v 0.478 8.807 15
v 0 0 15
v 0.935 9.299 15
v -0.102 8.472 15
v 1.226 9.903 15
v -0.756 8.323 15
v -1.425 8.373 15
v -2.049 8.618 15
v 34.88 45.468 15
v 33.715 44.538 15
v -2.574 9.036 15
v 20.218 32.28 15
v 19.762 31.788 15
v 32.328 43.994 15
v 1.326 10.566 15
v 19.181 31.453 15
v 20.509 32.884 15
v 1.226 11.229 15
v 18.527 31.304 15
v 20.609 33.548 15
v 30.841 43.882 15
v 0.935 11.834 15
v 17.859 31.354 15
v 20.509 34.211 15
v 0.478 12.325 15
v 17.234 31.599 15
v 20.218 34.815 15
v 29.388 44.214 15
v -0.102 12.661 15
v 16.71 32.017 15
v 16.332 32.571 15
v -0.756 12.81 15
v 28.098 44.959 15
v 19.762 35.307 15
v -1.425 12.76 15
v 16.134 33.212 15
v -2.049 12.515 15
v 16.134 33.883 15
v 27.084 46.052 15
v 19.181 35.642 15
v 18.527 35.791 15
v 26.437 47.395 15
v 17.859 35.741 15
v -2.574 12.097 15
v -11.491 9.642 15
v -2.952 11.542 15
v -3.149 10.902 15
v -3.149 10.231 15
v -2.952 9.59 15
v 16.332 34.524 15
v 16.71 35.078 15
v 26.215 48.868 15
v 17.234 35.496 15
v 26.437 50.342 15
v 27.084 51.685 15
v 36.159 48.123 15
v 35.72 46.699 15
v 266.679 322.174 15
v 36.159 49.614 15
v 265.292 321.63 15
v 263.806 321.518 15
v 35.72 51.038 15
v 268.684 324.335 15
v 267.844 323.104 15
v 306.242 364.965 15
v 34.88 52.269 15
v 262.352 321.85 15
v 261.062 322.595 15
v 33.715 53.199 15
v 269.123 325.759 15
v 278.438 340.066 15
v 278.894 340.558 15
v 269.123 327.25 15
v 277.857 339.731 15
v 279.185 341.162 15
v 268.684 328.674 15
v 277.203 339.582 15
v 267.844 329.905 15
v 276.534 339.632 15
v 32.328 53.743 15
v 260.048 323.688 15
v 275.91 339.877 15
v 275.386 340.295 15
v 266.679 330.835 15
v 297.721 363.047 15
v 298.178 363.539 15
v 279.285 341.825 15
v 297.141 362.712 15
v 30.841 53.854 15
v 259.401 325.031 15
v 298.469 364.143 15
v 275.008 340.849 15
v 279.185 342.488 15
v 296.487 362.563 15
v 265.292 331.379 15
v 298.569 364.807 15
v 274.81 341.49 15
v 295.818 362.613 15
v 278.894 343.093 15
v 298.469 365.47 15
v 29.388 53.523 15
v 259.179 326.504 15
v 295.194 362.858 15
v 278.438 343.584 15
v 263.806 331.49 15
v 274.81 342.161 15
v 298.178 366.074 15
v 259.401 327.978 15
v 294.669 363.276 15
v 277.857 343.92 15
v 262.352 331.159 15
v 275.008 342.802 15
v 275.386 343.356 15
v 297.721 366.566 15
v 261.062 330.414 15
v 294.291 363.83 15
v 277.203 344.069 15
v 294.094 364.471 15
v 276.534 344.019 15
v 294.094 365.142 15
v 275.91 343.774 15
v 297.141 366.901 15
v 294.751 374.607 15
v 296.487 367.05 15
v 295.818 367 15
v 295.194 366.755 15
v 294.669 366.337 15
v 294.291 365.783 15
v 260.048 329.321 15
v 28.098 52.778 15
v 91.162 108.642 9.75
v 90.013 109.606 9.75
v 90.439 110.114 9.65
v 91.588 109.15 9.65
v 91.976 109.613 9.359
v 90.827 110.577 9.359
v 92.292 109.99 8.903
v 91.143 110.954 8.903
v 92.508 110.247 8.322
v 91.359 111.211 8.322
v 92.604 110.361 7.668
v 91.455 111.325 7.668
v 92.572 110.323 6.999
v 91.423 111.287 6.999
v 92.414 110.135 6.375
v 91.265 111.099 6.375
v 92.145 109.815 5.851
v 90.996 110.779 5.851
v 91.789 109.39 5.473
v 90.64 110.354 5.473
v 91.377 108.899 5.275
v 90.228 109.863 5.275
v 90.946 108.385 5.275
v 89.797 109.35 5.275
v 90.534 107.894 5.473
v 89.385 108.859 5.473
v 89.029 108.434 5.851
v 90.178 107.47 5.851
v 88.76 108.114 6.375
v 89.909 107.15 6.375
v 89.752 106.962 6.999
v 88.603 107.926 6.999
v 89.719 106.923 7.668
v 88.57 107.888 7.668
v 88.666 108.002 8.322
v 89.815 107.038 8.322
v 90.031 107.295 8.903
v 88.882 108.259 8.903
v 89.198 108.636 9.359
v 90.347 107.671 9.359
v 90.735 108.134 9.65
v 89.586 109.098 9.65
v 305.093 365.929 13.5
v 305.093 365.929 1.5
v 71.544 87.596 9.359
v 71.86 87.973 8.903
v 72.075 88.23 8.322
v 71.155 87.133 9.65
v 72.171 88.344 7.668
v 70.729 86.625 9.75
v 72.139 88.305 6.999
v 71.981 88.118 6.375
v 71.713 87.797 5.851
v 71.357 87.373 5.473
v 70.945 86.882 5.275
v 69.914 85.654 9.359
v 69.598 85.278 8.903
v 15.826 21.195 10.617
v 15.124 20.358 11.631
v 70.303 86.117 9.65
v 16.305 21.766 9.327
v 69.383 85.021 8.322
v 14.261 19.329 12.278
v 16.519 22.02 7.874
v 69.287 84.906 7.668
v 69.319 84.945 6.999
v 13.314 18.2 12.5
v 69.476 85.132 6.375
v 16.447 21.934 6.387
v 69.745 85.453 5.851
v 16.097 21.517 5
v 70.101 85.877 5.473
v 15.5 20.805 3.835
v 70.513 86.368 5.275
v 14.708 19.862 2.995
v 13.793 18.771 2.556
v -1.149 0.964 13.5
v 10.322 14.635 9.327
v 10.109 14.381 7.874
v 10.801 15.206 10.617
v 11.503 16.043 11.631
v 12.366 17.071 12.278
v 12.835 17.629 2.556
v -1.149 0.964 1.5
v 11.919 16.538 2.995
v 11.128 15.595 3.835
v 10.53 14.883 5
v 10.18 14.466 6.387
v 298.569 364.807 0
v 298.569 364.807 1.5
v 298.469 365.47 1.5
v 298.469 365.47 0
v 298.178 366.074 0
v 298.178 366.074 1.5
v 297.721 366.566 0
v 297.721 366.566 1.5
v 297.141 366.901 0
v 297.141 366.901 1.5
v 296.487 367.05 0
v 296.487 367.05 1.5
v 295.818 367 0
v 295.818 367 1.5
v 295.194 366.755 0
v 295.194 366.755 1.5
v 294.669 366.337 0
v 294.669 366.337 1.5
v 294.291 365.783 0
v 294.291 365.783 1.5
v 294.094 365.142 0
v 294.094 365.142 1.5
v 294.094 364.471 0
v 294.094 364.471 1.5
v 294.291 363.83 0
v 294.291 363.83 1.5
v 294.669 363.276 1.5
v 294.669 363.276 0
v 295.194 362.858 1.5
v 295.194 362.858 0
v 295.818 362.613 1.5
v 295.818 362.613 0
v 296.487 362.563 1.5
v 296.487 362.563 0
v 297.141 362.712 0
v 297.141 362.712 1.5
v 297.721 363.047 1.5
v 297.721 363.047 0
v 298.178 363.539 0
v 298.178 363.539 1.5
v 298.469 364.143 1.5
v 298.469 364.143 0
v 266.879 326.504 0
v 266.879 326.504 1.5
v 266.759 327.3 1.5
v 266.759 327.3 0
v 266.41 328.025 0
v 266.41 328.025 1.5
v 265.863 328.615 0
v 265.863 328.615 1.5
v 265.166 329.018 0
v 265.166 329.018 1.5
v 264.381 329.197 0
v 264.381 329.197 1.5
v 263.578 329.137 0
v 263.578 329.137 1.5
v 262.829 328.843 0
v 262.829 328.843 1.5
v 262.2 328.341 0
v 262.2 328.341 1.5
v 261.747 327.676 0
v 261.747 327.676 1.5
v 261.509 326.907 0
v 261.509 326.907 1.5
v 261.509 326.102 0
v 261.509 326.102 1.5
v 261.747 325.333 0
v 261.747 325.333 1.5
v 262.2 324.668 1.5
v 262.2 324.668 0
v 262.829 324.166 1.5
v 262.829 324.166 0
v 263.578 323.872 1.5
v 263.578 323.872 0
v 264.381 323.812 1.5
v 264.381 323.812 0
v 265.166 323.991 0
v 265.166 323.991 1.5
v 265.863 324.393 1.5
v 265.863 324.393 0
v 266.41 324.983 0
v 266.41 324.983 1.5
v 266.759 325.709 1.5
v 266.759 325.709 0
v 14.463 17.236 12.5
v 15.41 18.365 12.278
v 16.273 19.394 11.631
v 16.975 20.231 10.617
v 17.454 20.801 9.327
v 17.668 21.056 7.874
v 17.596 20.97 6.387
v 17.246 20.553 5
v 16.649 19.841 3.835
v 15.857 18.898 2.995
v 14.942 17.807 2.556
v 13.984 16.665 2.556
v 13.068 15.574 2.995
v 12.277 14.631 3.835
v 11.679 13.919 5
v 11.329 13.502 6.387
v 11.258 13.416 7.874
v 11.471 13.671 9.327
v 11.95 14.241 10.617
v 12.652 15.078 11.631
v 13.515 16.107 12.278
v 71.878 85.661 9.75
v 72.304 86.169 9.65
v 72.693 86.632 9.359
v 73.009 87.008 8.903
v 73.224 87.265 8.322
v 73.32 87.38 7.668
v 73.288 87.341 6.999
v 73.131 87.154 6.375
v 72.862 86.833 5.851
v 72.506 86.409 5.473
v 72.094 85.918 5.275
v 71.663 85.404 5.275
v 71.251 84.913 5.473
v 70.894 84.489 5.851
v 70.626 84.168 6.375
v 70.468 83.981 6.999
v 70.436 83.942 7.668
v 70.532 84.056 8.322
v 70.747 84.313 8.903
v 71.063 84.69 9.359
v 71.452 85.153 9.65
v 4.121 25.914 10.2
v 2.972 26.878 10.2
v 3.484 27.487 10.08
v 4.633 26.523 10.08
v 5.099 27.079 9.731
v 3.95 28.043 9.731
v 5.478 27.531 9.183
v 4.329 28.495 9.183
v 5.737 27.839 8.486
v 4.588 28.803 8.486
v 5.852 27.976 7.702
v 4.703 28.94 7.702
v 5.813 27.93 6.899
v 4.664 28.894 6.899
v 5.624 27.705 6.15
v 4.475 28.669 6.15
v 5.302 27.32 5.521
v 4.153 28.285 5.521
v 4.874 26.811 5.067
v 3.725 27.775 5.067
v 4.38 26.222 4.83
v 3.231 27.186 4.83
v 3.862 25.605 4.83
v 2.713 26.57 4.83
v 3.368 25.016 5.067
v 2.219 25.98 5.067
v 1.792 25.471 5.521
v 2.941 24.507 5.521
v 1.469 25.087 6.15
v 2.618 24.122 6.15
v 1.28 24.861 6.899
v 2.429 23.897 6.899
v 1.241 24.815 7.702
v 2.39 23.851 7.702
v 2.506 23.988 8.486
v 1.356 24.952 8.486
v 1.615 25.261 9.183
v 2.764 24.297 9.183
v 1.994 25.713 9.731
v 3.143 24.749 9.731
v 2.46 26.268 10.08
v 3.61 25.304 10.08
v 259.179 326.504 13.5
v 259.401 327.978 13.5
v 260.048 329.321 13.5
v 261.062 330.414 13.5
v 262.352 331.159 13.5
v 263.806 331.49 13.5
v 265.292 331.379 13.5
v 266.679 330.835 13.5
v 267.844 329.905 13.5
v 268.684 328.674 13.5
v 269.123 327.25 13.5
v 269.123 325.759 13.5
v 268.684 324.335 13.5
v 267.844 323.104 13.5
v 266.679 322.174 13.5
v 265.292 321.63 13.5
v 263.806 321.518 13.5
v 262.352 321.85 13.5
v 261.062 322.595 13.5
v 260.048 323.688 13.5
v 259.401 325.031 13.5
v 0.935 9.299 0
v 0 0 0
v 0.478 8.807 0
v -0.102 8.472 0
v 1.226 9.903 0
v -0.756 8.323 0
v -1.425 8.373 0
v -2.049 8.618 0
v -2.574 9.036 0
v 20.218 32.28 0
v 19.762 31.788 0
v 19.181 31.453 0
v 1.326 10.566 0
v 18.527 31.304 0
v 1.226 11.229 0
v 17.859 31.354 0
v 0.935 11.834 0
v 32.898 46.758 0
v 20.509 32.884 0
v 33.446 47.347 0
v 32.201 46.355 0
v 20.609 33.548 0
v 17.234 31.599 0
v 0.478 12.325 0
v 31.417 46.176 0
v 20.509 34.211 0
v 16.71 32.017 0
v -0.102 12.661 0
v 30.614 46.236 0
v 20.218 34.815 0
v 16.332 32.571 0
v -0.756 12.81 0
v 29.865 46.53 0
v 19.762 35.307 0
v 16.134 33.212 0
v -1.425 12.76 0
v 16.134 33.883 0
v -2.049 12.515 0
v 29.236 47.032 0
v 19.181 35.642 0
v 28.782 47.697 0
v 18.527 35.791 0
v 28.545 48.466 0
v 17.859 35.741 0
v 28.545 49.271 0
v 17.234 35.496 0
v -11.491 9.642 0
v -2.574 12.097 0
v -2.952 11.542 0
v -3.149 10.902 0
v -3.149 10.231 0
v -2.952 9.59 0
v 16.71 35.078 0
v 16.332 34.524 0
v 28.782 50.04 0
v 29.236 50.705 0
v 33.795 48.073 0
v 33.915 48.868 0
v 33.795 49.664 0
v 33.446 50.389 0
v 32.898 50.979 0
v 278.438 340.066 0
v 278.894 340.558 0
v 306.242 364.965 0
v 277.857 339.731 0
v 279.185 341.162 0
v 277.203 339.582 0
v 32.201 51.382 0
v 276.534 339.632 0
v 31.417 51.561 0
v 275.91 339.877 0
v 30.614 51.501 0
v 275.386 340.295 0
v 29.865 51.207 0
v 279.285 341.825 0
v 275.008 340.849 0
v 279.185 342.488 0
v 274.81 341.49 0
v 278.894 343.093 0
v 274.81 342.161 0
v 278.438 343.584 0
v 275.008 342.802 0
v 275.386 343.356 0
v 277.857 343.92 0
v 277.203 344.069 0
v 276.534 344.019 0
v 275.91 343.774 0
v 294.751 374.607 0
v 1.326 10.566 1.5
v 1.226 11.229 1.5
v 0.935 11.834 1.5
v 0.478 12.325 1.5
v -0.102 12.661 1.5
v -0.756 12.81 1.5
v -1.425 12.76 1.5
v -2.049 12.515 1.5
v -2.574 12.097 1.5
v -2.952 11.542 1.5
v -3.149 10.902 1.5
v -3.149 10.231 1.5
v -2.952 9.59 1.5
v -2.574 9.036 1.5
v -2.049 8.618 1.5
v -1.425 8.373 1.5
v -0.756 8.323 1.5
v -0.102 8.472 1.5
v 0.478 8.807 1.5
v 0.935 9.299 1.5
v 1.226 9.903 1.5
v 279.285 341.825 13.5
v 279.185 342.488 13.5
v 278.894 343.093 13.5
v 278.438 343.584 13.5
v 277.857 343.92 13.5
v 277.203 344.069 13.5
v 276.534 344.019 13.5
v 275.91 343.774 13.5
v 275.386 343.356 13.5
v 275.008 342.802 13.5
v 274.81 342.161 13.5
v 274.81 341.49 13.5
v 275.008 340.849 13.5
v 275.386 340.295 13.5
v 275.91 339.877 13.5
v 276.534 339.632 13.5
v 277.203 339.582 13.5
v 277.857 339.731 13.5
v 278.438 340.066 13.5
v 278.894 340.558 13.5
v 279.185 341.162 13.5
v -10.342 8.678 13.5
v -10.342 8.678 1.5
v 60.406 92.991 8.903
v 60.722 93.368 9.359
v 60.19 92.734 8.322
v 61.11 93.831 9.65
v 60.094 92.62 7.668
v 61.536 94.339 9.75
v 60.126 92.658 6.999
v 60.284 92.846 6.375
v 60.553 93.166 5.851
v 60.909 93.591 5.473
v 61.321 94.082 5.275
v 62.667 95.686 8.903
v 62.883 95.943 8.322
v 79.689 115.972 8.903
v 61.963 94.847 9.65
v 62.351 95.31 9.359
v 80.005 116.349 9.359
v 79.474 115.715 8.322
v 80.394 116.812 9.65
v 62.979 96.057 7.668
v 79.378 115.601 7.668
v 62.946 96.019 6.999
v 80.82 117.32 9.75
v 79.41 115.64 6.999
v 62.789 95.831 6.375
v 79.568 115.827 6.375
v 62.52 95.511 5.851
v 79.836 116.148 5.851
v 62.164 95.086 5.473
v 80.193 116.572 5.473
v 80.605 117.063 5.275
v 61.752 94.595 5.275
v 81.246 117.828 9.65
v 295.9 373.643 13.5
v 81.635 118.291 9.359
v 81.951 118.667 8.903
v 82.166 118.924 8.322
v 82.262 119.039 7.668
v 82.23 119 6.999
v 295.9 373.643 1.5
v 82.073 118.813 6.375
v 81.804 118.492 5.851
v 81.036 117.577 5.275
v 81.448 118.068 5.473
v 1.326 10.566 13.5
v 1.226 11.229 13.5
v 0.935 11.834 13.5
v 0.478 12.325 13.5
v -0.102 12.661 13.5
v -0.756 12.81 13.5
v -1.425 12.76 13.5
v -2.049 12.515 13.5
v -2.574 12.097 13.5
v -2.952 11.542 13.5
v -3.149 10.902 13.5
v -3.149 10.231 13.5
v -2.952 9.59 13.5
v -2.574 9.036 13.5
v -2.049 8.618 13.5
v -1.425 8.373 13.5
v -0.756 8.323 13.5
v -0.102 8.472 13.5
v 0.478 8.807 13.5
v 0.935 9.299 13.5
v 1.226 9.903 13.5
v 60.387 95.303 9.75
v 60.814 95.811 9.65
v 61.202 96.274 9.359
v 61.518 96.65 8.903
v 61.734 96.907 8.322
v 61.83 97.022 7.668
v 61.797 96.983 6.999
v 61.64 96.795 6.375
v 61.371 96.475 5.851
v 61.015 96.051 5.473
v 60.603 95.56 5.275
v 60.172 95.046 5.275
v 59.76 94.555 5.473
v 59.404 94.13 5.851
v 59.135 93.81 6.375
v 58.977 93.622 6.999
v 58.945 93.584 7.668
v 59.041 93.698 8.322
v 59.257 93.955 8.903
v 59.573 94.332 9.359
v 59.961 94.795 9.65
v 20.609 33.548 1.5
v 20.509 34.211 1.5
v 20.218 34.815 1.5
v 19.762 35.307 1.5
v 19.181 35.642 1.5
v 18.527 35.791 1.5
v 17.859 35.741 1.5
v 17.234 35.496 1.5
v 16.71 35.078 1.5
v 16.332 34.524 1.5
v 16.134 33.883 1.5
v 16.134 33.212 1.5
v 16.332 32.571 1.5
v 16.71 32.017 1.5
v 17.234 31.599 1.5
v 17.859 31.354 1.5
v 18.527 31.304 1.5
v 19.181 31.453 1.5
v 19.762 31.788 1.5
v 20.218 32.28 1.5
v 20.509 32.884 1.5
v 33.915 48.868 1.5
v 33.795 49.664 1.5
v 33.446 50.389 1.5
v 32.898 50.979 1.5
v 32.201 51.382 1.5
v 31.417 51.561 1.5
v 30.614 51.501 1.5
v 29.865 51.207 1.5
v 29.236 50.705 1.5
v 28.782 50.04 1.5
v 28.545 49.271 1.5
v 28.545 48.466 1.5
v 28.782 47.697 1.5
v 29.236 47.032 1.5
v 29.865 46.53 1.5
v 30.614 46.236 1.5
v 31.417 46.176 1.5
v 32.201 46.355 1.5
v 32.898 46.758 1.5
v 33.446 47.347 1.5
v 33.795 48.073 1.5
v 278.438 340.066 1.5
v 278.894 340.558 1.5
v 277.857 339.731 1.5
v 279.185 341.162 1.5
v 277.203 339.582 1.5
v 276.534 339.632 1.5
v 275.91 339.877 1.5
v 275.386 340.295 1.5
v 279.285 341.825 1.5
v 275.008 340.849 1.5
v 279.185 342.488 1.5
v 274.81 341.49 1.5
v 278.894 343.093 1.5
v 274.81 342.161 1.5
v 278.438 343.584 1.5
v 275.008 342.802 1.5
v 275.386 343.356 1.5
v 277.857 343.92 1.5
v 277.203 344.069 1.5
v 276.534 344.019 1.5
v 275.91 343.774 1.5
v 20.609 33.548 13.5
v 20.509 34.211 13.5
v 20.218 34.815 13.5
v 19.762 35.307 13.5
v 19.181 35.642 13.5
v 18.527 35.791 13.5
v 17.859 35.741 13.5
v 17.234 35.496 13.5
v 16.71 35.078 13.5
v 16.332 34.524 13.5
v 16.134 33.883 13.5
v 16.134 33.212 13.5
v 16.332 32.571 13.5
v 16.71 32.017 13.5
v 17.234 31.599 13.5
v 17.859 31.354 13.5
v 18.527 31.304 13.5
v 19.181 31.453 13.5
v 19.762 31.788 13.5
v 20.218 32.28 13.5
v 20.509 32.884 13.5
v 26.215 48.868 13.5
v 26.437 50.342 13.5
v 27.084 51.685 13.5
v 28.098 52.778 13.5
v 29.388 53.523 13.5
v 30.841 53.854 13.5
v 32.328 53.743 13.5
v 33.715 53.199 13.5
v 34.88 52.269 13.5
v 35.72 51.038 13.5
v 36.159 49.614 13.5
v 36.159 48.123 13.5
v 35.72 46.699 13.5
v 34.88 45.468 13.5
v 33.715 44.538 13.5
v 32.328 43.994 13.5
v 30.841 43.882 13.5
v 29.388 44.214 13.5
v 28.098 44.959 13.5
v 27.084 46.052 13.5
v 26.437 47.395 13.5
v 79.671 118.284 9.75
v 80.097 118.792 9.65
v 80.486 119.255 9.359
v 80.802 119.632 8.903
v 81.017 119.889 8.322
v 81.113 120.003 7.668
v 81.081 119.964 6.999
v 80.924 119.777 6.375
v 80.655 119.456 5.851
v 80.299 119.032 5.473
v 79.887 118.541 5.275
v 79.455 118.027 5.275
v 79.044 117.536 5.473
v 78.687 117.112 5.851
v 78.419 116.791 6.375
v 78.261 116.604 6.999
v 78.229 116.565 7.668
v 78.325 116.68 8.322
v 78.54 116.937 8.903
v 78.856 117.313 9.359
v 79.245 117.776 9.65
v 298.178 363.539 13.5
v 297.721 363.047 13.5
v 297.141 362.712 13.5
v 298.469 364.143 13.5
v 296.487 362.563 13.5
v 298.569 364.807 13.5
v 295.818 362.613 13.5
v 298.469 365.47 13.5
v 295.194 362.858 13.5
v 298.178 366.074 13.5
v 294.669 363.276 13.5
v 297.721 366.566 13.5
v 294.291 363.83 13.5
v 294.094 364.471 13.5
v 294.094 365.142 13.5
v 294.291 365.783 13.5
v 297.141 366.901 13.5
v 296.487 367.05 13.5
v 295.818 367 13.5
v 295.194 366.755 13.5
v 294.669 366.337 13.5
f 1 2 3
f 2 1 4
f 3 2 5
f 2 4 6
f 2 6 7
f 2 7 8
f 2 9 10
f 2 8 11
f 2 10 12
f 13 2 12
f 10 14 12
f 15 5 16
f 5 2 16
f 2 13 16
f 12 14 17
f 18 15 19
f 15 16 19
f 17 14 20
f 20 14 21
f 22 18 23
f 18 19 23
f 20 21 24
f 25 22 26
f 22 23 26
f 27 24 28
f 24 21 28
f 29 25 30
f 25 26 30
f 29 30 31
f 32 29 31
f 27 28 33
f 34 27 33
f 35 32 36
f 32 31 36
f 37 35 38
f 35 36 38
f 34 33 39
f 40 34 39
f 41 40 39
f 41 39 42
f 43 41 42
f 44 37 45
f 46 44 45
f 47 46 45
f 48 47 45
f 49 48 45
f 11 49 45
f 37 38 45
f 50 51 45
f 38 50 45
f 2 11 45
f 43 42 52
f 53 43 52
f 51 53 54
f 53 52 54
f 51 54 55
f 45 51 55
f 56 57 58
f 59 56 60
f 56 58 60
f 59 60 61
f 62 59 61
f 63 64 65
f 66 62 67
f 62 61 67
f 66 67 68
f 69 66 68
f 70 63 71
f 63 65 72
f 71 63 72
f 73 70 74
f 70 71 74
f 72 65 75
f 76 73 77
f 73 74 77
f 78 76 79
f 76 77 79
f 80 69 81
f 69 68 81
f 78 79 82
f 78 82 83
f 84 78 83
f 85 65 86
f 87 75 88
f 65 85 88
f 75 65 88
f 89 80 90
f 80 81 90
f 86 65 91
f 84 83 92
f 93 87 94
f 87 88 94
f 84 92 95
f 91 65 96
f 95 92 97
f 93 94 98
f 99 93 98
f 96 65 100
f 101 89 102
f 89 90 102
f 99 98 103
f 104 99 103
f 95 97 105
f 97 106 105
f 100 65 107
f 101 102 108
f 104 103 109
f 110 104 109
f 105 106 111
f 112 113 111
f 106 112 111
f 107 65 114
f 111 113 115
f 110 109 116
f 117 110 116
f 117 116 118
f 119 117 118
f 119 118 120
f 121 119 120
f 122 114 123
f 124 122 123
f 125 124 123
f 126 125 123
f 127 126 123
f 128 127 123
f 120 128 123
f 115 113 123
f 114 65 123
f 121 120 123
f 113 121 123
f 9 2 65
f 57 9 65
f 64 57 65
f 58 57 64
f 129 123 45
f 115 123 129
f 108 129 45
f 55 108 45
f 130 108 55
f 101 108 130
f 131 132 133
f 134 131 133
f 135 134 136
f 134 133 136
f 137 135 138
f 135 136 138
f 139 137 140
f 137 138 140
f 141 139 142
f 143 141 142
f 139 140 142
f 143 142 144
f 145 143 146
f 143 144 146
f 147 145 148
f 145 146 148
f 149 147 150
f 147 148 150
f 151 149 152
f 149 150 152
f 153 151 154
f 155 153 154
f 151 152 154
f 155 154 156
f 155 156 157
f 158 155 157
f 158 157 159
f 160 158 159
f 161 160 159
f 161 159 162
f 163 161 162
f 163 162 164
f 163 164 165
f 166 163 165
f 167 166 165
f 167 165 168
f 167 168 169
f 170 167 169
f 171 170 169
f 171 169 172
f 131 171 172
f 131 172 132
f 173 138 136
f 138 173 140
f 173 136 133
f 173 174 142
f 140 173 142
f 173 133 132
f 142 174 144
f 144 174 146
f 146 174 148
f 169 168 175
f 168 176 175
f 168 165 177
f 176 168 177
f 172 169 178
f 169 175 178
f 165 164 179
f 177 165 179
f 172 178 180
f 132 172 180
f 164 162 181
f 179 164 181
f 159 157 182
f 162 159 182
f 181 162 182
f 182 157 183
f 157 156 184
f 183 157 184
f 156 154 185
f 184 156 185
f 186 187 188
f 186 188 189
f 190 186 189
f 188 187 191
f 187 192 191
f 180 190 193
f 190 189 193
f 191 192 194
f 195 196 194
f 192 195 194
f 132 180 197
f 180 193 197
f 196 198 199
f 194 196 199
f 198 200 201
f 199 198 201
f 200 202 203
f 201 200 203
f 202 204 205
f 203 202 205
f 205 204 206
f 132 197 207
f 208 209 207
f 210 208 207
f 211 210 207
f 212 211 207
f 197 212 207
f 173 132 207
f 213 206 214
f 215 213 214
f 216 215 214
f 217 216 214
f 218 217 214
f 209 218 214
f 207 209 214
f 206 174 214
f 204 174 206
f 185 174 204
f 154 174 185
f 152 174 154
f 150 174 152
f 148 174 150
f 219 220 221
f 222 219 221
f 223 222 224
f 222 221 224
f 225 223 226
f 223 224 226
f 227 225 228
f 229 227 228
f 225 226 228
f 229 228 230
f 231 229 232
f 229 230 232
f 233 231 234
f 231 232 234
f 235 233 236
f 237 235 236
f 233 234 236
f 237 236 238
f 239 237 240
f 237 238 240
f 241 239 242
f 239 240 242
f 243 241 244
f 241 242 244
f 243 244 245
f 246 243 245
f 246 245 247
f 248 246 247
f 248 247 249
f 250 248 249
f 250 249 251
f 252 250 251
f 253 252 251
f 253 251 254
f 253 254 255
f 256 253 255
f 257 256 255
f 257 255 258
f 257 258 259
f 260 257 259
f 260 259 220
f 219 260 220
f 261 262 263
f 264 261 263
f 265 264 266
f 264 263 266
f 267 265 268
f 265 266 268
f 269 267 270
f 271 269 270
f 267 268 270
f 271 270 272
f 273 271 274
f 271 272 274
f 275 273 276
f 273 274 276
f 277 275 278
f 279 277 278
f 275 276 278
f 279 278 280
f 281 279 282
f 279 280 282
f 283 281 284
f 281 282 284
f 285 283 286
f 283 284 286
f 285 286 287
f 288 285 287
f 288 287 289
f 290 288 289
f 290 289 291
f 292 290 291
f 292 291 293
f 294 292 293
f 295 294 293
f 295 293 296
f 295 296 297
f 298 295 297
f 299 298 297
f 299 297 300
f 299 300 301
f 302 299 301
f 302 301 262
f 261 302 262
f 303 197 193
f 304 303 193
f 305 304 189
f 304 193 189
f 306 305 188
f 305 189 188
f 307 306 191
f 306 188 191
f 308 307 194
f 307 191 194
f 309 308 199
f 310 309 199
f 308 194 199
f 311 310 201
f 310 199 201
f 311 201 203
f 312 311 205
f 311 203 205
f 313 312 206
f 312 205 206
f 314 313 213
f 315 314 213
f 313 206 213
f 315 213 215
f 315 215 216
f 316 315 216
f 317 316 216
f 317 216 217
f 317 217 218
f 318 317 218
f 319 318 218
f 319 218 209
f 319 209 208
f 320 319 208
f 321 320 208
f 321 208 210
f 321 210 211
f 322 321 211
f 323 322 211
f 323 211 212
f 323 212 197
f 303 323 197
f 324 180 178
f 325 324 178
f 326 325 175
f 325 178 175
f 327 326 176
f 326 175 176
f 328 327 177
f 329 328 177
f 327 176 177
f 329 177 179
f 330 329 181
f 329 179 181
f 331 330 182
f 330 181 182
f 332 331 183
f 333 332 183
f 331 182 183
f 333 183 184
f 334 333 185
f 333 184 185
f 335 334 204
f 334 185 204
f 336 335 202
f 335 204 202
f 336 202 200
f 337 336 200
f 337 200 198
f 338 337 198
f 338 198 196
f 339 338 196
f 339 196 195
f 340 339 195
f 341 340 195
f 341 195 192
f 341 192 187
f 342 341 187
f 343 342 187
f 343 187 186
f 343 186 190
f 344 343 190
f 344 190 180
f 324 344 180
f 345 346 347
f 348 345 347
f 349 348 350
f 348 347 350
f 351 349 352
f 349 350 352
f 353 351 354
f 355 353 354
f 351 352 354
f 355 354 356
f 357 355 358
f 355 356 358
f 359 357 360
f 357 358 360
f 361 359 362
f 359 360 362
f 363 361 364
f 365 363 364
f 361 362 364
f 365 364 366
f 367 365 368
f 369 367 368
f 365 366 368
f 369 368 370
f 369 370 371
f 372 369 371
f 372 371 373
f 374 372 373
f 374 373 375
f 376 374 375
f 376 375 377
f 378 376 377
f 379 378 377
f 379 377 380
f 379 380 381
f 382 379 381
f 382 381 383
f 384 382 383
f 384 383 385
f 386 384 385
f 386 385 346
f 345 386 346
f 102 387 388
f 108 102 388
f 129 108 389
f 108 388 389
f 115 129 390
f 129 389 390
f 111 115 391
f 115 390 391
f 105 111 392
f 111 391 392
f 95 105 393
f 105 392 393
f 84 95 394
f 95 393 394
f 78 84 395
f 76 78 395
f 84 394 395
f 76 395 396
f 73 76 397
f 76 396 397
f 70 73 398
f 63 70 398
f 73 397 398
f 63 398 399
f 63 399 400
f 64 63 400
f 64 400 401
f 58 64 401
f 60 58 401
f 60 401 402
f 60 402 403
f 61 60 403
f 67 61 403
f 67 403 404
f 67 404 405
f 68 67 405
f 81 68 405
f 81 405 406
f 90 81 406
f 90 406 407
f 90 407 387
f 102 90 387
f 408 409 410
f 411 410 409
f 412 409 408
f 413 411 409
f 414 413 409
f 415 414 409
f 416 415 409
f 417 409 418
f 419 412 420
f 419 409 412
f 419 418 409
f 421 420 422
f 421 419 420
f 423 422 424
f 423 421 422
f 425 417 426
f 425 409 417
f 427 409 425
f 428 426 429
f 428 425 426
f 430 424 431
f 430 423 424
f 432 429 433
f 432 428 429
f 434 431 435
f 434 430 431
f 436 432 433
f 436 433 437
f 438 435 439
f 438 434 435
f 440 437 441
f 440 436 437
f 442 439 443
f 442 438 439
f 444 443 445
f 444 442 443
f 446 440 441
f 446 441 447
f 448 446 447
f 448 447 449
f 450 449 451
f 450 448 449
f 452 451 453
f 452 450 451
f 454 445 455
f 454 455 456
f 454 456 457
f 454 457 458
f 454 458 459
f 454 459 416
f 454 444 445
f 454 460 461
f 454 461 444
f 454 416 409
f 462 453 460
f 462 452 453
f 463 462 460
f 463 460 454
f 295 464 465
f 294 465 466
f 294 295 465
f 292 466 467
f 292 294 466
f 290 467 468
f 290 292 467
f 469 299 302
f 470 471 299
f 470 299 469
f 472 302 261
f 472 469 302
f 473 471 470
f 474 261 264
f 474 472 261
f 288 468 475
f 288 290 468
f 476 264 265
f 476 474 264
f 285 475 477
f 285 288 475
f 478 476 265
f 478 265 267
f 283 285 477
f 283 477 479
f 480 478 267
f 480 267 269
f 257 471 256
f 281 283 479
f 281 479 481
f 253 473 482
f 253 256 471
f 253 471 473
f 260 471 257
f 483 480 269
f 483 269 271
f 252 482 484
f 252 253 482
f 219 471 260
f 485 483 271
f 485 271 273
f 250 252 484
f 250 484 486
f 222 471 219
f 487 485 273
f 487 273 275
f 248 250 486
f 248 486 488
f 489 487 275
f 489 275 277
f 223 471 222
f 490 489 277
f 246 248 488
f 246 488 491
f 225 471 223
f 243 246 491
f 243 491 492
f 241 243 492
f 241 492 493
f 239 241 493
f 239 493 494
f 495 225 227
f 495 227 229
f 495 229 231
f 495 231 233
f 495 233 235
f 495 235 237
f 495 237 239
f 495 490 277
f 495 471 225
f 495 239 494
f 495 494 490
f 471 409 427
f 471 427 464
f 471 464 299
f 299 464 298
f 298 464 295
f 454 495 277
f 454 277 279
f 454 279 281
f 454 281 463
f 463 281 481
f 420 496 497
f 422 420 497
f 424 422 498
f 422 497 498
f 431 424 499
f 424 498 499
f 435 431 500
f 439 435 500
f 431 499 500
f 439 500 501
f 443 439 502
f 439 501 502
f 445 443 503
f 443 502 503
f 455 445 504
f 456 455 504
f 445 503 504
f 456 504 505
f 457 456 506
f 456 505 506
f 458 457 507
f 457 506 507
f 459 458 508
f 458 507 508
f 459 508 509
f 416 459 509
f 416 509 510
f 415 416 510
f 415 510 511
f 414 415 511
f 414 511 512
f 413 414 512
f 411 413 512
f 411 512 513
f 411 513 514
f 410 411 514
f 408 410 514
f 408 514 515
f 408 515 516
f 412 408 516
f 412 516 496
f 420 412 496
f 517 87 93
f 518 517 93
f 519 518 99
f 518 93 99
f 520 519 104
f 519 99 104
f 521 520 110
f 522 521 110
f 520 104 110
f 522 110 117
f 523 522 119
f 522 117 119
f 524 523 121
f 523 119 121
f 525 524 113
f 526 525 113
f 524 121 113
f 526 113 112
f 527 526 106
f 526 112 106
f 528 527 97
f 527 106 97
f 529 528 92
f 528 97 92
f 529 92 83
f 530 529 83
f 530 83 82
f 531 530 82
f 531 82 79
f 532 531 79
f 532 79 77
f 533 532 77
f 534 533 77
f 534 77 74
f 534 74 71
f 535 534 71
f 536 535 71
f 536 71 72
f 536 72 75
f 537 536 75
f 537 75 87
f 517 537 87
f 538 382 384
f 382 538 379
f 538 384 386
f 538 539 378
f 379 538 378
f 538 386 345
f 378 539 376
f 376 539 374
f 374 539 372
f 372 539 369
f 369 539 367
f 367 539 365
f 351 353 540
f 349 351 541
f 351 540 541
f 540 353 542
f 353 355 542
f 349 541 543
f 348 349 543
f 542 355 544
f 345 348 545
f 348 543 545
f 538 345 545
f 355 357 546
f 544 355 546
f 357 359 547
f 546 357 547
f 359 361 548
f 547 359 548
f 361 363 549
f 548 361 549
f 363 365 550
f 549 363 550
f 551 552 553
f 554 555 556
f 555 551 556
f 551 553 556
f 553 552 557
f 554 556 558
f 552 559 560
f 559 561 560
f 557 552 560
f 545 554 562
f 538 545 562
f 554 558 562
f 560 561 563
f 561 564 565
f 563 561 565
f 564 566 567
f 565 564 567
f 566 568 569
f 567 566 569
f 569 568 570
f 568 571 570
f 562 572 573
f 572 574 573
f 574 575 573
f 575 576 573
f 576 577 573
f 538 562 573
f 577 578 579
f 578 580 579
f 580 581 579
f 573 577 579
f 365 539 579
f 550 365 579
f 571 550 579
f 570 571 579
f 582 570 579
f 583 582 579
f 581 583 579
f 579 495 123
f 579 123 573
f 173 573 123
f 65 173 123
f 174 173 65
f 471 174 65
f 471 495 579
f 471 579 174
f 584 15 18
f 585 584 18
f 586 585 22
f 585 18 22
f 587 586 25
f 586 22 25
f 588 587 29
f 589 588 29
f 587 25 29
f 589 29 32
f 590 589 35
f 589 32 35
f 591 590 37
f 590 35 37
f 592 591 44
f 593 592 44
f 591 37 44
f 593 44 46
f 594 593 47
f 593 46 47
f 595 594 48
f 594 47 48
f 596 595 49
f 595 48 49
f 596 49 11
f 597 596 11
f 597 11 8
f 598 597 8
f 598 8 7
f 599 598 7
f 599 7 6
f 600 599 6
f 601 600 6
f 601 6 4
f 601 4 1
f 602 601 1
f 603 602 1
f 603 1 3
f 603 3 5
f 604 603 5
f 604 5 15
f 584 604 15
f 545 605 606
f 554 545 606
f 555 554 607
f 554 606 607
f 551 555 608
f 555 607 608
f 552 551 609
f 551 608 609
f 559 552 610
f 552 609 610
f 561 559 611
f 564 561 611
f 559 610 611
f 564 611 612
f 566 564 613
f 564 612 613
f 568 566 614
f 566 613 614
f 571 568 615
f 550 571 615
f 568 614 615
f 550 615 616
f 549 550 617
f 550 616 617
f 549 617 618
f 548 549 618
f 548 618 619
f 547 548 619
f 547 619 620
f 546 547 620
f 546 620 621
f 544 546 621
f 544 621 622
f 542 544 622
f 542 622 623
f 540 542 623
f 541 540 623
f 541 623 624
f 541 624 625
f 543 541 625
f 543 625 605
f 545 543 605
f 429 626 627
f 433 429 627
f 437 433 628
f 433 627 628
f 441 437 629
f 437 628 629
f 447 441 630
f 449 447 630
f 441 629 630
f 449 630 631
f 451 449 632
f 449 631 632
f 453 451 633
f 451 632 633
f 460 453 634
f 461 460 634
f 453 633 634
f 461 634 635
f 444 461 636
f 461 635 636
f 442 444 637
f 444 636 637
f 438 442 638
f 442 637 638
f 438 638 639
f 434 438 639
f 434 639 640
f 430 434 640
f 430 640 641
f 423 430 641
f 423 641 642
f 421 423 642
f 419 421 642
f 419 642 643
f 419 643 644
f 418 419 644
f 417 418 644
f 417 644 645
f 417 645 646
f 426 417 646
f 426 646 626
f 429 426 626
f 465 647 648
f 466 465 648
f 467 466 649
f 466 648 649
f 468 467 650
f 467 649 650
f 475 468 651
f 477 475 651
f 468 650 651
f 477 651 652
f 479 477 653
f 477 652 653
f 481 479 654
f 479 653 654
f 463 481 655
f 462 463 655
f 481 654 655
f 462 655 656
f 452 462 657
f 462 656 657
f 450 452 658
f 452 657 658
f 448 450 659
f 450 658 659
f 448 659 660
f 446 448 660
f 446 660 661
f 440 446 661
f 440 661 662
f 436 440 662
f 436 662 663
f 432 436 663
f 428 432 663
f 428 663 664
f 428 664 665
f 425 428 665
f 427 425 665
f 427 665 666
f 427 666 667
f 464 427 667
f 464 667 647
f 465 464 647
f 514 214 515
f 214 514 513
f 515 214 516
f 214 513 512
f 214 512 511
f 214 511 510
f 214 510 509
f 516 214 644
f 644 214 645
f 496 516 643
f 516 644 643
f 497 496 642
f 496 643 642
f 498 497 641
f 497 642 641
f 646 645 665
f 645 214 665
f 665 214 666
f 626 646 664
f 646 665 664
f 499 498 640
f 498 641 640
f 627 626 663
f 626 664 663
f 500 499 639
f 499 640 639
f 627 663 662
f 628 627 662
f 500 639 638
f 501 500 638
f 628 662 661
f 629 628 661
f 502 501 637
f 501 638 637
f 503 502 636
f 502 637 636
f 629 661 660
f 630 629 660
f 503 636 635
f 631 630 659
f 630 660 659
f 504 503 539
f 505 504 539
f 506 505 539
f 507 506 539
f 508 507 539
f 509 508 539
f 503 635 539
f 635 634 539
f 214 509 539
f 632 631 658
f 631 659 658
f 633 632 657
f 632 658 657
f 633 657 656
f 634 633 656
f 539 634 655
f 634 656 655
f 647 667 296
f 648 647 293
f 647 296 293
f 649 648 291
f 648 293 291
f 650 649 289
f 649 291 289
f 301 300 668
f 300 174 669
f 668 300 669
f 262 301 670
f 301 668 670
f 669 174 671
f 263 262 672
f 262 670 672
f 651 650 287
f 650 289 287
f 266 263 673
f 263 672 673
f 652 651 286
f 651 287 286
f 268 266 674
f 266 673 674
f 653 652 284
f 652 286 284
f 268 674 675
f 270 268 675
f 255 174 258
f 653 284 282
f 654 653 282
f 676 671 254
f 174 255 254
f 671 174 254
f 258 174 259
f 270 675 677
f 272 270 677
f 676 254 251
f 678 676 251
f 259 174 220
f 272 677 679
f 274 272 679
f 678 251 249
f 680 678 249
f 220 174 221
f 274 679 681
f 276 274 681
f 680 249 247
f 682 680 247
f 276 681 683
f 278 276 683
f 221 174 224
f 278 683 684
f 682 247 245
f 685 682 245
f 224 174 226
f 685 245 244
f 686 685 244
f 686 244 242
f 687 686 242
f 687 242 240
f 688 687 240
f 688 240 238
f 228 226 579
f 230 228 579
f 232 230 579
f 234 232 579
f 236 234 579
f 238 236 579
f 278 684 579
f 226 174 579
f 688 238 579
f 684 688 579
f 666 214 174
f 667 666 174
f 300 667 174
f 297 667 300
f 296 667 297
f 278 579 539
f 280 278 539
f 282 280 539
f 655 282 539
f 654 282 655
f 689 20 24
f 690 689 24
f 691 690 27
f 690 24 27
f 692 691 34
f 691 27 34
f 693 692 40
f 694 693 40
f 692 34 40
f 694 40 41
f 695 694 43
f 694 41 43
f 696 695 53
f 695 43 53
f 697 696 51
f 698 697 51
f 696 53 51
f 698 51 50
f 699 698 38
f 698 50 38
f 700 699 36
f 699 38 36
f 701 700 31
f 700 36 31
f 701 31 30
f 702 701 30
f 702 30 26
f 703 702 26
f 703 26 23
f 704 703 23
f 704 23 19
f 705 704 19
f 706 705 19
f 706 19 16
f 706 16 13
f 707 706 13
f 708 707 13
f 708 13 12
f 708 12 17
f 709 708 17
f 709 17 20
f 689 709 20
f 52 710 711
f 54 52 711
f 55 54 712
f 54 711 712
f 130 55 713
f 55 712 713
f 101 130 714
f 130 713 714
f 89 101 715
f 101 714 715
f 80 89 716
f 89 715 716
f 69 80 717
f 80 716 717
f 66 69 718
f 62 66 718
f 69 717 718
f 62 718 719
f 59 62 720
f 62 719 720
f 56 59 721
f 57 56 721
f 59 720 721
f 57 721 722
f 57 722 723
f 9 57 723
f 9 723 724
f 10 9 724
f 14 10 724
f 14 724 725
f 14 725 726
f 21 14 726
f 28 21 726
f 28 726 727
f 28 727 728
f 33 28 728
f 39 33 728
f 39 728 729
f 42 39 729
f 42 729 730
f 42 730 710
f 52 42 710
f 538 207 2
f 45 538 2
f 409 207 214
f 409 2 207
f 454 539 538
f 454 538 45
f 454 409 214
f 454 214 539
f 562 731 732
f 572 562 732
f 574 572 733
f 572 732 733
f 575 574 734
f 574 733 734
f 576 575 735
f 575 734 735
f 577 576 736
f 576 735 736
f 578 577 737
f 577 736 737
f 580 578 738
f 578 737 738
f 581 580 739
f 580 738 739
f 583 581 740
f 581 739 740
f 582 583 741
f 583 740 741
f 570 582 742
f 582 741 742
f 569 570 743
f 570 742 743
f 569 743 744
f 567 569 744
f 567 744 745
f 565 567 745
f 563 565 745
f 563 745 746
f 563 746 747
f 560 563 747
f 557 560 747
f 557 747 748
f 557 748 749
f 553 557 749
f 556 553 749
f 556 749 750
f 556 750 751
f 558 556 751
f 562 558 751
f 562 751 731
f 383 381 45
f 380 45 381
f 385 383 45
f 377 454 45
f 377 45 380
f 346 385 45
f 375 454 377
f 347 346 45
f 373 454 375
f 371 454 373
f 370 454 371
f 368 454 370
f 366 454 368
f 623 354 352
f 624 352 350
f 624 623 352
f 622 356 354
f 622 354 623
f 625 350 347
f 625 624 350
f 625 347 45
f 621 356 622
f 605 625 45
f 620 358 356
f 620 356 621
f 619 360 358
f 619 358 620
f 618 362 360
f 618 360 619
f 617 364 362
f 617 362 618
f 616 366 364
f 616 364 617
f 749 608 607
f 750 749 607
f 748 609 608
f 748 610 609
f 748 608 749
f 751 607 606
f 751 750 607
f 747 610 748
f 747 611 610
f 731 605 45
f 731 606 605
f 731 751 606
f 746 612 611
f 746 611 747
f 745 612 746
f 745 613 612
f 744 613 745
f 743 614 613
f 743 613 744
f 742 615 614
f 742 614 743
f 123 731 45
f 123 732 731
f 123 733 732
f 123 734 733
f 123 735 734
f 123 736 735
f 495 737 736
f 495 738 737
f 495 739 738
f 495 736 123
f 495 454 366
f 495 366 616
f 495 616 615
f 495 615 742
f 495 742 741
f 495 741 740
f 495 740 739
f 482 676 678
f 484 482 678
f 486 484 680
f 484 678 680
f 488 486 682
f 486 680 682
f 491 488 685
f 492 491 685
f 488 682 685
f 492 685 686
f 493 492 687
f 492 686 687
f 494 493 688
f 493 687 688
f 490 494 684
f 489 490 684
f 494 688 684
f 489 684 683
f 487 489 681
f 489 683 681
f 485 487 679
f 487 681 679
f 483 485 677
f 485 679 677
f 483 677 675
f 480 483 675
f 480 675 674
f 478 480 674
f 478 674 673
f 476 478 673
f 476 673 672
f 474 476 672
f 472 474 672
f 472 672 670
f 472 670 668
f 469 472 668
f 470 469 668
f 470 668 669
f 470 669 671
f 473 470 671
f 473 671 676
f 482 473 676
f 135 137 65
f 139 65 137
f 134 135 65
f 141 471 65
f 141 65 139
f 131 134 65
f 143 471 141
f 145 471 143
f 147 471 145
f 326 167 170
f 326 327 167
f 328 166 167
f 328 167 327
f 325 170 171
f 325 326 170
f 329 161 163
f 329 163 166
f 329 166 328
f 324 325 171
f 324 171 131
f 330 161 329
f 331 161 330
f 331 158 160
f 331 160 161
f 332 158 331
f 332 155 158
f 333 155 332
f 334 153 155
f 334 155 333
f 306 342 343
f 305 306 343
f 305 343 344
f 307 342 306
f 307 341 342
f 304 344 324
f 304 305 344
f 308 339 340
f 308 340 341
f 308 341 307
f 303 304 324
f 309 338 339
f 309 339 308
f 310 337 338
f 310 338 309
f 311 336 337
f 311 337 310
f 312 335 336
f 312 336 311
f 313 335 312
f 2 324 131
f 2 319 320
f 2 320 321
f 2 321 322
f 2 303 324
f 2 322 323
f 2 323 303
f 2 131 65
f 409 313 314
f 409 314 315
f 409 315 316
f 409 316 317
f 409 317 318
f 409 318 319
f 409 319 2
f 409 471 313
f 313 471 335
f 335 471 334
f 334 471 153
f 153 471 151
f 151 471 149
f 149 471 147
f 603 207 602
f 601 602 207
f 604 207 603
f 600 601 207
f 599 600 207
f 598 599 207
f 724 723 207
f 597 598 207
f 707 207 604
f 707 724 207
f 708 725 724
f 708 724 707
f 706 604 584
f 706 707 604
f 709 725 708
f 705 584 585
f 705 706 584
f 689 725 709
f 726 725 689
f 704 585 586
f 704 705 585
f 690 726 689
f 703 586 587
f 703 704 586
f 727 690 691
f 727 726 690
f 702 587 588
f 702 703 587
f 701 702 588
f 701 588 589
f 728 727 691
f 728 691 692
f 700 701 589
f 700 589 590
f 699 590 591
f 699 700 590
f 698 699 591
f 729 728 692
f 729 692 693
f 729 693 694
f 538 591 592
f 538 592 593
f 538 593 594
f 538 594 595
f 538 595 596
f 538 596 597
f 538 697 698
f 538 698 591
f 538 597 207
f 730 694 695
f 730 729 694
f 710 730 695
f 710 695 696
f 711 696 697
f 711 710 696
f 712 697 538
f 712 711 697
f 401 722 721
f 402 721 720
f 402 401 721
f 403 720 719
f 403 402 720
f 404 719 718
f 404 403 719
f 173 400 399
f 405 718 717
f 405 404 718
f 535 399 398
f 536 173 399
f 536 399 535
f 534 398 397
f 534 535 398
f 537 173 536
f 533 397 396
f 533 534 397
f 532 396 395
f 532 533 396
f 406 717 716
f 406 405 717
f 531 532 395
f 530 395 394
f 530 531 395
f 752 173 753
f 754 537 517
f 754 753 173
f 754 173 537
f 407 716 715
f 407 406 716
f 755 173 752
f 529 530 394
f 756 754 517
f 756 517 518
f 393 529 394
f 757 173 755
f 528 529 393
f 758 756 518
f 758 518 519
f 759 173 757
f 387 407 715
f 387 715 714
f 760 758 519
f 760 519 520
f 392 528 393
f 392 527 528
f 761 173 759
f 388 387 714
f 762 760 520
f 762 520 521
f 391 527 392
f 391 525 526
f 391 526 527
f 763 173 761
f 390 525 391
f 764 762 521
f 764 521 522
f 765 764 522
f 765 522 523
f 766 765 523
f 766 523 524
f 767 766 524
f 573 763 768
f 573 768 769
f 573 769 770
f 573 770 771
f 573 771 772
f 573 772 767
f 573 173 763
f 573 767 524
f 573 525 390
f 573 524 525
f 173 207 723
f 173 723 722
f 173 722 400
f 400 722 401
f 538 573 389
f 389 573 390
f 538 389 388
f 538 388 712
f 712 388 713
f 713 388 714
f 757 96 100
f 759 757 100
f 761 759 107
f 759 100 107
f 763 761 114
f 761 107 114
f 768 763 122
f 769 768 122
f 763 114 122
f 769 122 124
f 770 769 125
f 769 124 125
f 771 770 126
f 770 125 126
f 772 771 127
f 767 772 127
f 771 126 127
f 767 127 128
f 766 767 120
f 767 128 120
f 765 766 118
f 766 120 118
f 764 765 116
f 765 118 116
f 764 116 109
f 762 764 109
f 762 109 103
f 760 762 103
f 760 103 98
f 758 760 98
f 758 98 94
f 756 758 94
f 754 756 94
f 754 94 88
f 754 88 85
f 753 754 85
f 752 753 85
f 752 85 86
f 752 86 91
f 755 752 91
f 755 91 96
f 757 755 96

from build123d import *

# Parameters (mm, degrees)
EXTRUDE_1_DEPTH             = 15
SHELL_1_T                   = -1.5
SKETCH_3_R                  = 2.25
SKETCH_3_R_2                = 2.7
CUT_EXTRUDE_1_DEPTH         = 25
SKETCH_5_R                  = 2.25
SKETCH_5_R_2                = 2.7
CUT_EXTRUDE_3_DEPTH         = 20
SKETCH_7_W                  = 15
SKETCH_7_H                  = 15
SKETCH_7_W_2                = 12
SKETCH_7_H_2                = 12
CUT_EXTRUDE_4_DEPTH         = 1
HOLE_WIZARD_10_0_10_1_D     = 10
HOLE_WIZARD_10_0_10_1_DEPTH = 1.5
HOLE_WIZARD_10_0_10_2_D     = 10
HOLE_WIZARD_10_0_10_2_DEPTH = 1.5


with BuildPart() as part:
    # ｽｹｯﾁ1 → ﾎﾞｽ - 押し出し1 (new body)
    with BuildSketch(Plane.XY):
        Polygon((306.8847856, 365.731045751), (0, 0), (-11.490666647, 9.641814145), (295.394118953, 375.372859896), align=None)
    extrude(amount=EXTRUDE_1_DEPTH)

    # ｼｪﾙ1
    shell_1_openings = [part.faces().sort_by_distance(p)[0] for p in [
        (301.139452276, 370.551952824, 7.5),
        (-5.745333323, 4.820907073, 7.5),
    ]]
    offset(amount=SHELL_1_T, openings=shell_1_openings, kind=Kind.INTERSECTION)

    # ｽｹｯﾁ3 → ｶｯﾄ - 押し出し1 (cut)
    with BuildSketch(Plane.XY.offset(15)):
        with Locations((-0.924426251, 10.566240396)):
            Circle(SKETCH_3_R)
        with Locations((18.35920204, 33.54757369)):
            Circle(SKETCH_3_R)
        with Locations((277.034916913, 341.825286207)):
            Circle(SKETCH_3_R)
        with Locations((296.318545204, 364.8066195)):
            Circle(SKETCH_3_R)
        with Locations((31.214954234, 48.868462552)):
            Circle(SKETCH_3_R_2)
        with Locations((264.179164719, 326.504397344)):
            Circle(SKETCH_3_R_2)
    extrude(amount=-CUT_EXTRUDE_1_DEPTH, mode=Mode.SUBTRACT)

    # ｽｹｯﾁ5 → ｶｯﾄ - 押し出し3 (cut)
    with BuildSketch(Plane(origin=(-11.490666647, 9.641814145, 0), x_dir=(0, 0, 1), z_dir=(-0.766044443, 0.64278761, 0))):
        with Locations((7.5, 141.822406051)):
            Circle(SKETCH_5_R)
        with Locations((7.5, 111.822406051)):
            Circle(SKETCH_5_R)
        with Locations((7.5, 22.5)):
            Circle(SKETCH_5_R_2)
    extrude(amount=-CUT_EXTRUDE_3_DEPTH, mode=Mode.SUBTRACT)

    # ｽｹｯﾁ7 → ｶｯﾄ - 押し出し4 (cut)
    with BuildSketch(Plane(origin=(306.8847856, 365.731045751, 0), x_dir=(0.766044443, -0.64278761, 0), z_dir=(0.64278761, 0.766044443, 0))):
        with Locations((-7.5, -7.5)):
            Rectangle(SKETCH_7_W, SKETCH_7_H)
        with Locations((-7.5, -7.5)):
            Rectangle(SKETCH_7_W_2, SKETCH_7_H_2, mode=Mode.SUBTRACT)
    extrude(amount=-CUT_EXTRUDE_4_DEPTH, mode=Mode.SUBTRACT)

    # Ø10.0 (10) 直径の穴1
    with Locations(Plane(origin=(0, 0, 0), x_dir=(0, 0, -1), z_dir=(0.766044443, -0.64278761, 0))):
        with Locations((-7.5, 22.5)):
            Hole(HOLE_WIZARD_10_0_10_1_D / 2, depth=HOLE_WIZARD_10_0_10_1_DEPTH)

    # Ø10.0 (10) 直径の穴2
    with Locations(Plane.XY.offset(15)):
        with Locations((31.214954234, 48.868462552), (264.179164719, 326.504397344)):
            Hole(HOLE_WIZARD_10_0_10_2_D / 2, depth=HOLE_WIZARD_10_0_10_2_DEPTH)


solid = part.part
